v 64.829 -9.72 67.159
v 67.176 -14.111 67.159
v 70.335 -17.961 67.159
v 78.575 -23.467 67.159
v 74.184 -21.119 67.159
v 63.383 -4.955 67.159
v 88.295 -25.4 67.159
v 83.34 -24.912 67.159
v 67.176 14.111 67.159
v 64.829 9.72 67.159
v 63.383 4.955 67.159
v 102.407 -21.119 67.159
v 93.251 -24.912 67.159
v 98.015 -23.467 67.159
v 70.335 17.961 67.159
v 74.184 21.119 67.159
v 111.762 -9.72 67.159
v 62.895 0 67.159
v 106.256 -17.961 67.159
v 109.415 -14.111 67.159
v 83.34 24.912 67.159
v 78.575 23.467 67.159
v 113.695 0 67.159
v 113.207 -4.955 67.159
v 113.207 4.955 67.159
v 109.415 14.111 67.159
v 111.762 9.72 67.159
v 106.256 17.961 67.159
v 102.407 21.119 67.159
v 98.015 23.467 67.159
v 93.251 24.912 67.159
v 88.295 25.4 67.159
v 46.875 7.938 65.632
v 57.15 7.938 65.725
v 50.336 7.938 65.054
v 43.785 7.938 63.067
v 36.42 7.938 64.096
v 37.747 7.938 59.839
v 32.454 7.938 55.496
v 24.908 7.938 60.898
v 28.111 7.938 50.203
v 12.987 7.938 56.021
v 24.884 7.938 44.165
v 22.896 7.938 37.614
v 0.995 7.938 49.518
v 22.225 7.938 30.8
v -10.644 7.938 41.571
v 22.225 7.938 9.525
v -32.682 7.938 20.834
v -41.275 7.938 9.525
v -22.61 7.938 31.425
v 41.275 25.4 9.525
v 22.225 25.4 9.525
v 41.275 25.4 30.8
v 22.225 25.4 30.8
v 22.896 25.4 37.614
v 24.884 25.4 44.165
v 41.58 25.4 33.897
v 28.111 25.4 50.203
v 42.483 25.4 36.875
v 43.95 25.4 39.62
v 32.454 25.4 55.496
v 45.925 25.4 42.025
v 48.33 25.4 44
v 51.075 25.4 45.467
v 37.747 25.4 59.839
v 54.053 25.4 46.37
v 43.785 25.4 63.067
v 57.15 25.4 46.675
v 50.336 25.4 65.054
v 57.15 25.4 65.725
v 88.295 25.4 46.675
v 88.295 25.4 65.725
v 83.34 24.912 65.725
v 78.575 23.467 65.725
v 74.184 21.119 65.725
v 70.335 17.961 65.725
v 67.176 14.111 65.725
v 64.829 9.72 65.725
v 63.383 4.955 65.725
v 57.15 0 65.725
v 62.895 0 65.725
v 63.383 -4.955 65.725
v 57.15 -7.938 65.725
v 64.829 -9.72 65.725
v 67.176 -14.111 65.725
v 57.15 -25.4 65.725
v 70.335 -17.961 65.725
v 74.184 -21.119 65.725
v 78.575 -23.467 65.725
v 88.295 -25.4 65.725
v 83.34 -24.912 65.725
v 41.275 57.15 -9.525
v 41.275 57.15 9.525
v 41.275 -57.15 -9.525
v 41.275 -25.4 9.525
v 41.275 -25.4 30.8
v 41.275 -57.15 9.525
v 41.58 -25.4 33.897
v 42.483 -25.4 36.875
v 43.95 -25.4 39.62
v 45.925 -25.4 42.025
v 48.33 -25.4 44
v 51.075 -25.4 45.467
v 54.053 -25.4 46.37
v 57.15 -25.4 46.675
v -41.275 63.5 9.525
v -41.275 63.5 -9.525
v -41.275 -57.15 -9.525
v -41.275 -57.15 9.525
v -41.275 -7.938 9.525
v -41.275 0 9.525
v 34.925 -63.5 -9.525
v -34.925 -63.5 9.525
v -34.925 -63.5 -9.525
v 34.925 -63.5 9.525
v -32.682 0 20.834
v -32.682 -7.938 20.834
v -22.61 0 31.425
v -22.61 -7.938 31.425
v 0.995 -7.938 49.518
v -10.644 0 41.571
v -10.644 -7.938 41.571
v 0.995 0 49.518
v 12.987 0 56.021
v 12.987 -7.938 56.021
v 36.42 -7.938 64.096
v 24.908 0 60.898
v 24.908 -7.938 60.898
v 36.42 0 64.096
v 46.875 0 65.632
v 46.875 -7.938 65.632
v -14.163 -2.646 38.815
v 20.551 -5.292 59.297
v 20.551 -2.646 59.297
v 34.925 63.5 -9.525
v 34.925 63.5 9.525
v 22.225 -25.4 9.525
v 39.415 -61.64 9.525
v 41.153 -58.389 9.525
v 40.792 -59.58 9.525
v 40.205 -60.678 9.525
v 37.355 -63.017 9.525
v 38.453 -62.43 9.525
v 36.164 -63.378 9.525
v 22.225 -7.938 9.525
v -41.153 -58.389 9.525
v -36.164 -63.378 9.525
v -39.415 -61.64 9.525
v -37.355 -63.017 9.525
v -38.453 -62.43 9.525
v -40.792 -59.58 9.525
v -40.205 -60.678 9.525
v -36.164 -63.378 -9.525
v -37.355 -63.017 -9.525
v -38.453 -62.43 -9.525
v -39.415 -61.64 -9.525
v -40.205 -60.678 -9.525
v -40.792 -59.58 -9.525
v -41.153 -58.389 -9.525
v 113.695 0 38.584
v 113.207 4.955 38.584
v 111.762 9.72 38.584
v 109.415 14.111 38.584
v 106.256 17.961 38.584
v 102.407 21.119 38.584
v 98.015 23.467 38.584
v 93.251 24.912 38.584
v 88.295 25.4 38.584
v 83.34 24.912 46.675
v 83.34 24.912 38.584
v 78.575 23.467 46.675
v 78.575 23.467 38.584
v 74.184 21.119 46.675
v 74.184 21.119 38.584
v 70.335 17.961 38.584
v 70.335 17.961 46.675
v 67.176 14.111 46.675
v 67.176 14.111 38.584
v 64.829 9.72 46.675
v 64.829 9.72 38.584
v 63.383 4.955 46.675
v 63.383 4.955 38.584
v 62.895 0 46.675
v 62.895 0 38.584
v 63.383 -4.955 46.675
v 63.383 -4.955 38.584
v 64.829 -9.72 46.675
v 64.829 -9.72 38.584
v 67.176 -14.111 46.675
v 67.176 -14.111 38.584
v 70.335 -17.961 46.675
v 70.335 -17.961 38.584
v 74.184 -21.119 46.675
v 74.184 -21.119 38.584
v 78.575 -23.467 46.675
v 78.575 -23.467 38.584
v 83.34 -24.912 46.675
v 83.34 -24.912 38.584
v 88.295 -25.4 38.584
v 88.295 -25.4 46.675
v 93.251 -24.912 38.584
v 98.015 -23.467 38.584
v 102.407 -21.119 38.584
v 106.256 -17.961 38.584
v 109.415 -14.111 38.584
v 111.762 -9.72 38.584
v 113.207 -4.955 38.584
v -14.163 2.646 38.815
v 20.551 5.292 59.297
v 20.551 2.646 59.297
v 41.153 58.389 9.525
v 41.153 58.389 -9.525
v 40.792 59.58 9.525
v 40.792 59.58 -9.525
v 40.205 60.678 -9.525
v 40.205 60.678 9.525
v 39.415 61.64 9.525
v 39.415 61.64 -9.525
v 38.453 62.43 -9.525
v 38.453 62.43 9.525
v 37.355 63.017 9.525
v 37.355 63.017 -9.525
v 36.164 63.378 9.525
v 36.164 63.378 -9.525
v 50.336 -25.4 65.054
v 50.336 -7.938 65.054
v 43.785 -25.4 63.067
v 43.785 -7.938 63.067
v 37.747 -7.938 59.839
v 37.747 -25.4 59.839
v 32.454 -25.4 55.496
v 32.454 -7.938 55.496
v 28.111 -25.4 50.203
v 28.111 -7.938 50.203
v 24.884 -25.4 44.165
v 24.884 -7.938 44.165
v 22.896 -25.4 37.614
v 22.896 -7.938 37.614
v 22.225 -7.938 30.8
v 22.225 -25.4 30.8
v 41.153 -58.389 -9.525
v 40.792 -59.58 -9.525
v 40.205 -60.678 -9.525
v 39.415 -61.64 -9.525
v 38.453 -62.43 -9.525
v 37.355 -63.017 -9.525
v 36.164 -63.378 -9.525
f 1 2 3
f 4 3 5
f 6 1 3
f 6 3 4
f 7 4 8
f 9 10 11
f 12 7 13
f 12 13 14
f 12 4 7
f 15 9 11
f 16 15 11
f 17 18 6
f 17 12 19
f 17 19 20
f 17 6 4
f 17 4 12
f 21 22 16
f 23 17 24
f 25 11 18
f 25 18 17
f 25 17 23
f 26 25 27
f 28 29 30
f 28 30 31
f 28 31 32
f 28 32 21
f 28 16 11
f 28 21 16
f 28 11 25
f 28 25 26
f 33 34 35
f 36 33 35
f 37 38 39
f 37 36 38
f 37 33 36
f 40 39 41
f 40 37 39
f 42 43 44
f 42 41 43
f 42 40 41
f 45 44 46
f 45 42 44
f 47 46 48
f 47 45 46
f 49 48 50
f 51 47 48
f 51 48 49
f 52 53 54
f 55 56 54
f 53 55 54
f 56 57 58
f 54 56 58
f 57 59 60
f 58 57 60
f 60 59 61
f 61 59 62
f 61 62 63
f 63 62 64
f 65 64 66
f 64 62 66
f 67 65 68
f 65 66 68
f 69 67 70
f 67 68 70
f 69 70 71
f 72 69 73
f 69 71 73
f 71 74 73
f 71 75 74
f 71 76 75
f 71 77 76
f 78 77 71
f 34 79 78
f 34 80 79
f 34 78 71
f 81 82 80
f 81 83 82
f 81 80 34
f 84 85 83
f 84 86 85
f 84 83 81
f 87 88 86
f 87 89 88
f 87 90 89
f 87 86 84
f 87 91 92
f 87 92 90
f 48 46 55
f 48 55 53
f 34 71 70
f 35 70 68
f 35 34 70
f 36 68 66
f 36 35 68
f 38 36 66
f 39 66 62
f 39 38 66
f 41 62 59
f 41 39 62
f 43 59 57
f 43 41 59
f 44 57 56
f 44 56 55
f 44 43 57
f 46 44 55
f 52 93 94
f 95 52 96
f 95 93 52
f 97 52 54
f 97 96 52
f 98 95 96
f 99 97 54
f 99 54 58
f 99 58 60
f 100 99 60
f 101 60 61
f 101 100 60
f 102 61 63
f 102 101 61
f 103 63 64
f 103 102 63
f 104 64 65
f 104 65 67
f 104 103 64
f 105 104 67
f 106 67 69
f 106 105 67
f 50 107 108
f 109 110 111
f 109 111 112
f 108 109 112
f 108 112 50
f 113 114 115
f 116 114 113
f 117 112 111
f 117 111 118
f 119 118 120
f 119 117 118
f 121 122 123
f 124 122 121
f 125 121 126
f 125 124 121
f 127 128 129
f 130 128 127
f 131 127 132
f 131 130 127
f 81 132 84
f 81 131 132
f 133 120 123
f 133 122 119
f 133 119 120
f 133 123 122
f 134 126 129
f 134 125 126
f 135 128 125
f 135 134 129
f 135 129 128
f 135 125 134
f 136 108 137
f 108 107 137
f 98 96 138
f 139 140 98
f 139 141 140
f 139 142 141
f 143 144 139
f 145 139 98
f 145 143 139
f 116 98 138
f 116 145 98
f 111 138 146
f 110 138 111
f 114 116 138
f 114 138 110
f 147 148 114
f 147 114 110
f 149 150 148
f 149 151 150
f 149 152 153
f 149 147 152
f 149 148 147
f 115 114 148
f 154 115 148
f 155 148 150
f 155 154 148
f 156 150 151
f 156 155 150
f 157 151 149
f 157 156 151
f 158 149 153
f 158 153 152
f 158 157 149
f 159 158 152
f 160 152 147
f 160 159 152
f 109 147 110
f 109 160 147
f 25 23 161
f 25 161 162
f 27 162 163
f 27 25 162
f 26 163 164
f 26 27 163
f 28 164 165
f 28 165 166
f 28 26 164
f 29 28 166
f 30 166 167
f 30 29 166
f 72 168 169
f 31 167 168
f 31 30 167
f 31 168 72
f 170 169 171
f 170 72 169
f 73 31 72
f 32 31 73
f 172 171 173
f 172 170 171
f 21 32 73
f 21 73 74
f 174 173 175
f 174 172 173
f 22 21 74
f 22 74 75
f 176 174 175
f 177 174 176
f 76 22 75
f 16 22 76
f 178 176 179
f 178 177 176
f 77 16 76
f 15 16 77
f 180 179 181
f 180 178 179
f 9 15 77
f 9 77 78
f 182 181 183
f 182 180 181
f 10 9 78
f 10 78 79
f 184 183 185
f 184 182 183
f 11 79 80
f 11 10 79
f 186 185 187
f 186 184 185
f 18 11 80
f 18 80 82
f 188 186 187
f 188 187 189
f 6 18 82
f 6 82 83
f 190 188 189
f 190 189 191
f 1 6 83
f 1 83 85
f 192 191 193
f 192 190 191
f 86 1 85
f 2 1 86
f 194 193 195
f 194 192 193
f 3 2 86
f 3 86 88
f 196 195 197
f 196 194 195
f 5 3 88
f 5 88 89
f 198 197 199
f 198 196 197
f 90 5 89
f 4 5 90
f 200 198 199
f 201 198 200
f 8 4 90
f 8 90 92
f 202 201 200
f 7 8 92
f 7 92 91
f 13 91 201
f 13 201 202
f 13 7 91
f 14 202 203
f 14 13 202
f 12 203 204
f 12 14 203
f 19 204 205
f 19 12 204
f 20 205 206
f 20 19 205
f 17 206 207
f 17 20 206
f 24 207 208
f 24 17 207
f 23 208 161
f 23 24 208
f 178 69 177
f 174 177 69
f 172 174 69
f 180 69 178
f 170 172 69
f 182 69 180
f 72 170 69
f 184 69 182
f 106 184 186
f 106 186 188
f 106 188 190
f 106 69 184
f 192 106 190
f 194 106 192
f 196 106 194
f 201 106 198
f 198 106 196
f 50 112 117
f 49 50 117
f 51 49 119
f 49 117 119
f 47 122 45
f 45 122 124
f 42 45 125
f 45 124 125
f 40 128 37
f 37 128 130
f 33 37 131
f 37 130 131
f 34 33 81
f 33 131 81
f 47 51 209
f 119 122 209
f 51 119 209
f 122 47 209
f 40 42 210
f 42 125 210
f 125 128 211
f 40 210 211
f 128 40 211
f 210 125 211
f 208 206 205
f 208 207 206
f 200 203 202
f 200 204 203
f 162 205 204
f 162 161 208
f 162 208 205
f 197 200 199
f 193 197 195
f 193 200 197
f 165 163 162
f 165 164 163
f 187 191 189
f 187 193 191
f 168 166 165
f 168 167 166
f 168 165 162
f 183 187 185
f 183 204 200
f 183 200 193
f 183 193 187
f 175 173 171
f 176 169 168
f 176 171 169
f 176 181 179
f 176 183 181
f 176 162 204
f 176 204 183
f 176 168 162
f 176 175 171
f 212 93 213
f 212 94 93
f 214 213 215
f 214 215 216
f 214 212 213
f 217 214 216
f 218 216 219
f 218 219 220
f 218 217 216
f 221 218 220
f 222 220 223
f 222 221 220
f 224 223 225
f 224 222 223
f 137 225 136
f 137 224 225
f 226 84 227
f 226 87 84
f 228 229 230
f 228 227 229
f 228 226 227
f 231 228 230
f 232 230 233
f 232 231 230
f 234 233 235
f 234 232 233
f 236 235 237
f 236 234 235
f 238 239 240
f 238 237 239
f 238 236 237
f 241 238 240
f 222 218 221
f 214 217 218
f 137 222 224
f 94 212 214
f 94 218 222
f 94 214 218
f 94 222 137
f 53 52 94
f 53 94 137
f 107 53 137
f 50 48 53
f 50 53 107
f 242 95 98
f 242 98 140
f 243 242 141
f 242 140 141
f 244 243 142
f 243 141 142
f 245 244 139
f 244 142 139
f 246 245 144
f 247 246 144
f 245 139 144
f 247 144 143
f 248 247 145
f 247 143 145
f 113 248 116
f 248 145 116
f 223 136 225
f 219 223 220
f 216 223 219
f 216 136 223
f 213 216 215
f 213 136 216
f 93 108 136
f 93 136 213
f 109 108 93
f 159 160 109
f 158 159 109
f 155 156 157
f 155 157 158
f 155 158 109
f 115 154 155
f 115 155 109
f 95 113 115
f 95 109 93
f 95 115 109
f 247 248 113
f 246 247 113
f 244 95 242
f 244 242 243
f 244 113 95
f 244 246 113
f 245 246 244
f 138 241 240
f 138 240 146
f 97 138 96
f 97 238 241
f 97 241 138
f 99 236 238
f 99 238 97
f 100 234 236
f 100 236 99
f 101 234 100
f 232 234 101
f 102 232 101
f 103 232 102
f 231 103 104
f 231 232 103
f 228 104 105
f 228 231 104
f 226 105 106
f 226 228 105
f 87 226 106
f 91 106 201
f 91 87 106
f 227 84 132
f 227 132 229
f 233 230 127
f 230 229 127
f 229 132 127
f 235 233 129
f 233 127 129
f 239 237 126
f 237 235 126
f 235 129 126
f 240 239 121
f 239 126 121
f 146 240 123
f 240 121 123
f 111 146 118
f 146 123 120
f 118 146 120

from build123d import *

# Parameters (mm, degrees)
F1_DEPTH = 63.5
F0_W     = 25.4
F0_H     = 19.05
F2_DEPTH = 25.4
F3_DEPTH = 7.9375
F5_R     = 6.35


with BuildPart() as f1:
    # F0 (on Front) → F1 (new body, symmetric)
    with BuildSketch(Plane.XZ):
        Polygon((-41.275, 9.525), (-41.275, -9.525), (41.275, -9.525), (41.275, 9.525), (22.225, 9.525), align=None)
    extrude(amount=F1_DEPTH, both=True)

    # F0 (on Front) → F2 (join, symmetric)
    with BuildSketch(Plane.XZ):
        with BuildLine():
            Line((22.225, 9.525), (41.275, 9.525))
            Line((41.275, 9.525), (41.275, 30.8000269385))
            ThreePointArc((41.275, 30.8000269385), (45.9246798487, 42.0253470898), (57.15, 46.6750269385))
            Line((57.15, 46.6750269385), (62.8952502342, 46.6750269385))
            Line((62.8952502342, 46.6750269385), (62.8952502342, 65.7250269385))
            Line((62.8952502342, 65.7250269385), (57.15, 65.7250269385))
            ThreePointArc((57.15, 65.7250269385), (32.4542956671, 55.4957312714), (22.225, 30.8000269385))
            Line((22.225, 30.8000269385), (22.225, 9.525))
        make_face()
        with Locations((75.5952502342, 56.2000269385)):
            Rectangle(F0_W, F0_H)
    extrude(amount=F2_DEPTH, both=True)

    # F0 (on Front) → F3 (join, symmetric)
    with BuildSketch(Plane.XZ):
        with BuildLine():
            add(Edge.make_bspline(
                [(-41.275, 9.525), (-19.8715052223, 41.4688585122), (21.5158074969, 68.07404407), (57.15, 65.7250269385)],
                knots=[0, 0, 0, 0, 113.3398590651, 113.3398590651, 113.3398590651, 113.3398590651], degree=3))
            Line((-41.275, 9.525), (22.225, 9.525))
            Line((22.225, 9.525), (22.225, 30.8000269385))
            ThreePointArc((22.225, 30.8000269385), (32.4542956671, 55.4957312714), (57.15, 65.7250269385))
        make_face()
    extrude(amount=F3_DEPTH, both=True)

    # F0 (on Front) → F4 (revolve)
    with BuildSketch(Plane.XZ):
        Polygon((88.2952502342, 67.1590872239), (88.2952502342, 65.7250269385), (88.2952502342, 46.6750269385), (88.2952502342, 38.5840872239), (113.6952502342, 38.5840872239), (113.6952502342, 67.1590872239), align=None)
    revolve(axis=Axis((88.2952502342, 0, 52.8715872239), (0, 0, 1)))

    # F5
    f5_edges = [f1.edges().sort_by_distance(p)[0] for p in [
        (41.275, -63.5, 0),
        (-41.275, -63.5, 0),
        (41.275, 63.5, 0),
    ]]
    fillet(f5_edges, radius=F5_R)


solid = f1.part
